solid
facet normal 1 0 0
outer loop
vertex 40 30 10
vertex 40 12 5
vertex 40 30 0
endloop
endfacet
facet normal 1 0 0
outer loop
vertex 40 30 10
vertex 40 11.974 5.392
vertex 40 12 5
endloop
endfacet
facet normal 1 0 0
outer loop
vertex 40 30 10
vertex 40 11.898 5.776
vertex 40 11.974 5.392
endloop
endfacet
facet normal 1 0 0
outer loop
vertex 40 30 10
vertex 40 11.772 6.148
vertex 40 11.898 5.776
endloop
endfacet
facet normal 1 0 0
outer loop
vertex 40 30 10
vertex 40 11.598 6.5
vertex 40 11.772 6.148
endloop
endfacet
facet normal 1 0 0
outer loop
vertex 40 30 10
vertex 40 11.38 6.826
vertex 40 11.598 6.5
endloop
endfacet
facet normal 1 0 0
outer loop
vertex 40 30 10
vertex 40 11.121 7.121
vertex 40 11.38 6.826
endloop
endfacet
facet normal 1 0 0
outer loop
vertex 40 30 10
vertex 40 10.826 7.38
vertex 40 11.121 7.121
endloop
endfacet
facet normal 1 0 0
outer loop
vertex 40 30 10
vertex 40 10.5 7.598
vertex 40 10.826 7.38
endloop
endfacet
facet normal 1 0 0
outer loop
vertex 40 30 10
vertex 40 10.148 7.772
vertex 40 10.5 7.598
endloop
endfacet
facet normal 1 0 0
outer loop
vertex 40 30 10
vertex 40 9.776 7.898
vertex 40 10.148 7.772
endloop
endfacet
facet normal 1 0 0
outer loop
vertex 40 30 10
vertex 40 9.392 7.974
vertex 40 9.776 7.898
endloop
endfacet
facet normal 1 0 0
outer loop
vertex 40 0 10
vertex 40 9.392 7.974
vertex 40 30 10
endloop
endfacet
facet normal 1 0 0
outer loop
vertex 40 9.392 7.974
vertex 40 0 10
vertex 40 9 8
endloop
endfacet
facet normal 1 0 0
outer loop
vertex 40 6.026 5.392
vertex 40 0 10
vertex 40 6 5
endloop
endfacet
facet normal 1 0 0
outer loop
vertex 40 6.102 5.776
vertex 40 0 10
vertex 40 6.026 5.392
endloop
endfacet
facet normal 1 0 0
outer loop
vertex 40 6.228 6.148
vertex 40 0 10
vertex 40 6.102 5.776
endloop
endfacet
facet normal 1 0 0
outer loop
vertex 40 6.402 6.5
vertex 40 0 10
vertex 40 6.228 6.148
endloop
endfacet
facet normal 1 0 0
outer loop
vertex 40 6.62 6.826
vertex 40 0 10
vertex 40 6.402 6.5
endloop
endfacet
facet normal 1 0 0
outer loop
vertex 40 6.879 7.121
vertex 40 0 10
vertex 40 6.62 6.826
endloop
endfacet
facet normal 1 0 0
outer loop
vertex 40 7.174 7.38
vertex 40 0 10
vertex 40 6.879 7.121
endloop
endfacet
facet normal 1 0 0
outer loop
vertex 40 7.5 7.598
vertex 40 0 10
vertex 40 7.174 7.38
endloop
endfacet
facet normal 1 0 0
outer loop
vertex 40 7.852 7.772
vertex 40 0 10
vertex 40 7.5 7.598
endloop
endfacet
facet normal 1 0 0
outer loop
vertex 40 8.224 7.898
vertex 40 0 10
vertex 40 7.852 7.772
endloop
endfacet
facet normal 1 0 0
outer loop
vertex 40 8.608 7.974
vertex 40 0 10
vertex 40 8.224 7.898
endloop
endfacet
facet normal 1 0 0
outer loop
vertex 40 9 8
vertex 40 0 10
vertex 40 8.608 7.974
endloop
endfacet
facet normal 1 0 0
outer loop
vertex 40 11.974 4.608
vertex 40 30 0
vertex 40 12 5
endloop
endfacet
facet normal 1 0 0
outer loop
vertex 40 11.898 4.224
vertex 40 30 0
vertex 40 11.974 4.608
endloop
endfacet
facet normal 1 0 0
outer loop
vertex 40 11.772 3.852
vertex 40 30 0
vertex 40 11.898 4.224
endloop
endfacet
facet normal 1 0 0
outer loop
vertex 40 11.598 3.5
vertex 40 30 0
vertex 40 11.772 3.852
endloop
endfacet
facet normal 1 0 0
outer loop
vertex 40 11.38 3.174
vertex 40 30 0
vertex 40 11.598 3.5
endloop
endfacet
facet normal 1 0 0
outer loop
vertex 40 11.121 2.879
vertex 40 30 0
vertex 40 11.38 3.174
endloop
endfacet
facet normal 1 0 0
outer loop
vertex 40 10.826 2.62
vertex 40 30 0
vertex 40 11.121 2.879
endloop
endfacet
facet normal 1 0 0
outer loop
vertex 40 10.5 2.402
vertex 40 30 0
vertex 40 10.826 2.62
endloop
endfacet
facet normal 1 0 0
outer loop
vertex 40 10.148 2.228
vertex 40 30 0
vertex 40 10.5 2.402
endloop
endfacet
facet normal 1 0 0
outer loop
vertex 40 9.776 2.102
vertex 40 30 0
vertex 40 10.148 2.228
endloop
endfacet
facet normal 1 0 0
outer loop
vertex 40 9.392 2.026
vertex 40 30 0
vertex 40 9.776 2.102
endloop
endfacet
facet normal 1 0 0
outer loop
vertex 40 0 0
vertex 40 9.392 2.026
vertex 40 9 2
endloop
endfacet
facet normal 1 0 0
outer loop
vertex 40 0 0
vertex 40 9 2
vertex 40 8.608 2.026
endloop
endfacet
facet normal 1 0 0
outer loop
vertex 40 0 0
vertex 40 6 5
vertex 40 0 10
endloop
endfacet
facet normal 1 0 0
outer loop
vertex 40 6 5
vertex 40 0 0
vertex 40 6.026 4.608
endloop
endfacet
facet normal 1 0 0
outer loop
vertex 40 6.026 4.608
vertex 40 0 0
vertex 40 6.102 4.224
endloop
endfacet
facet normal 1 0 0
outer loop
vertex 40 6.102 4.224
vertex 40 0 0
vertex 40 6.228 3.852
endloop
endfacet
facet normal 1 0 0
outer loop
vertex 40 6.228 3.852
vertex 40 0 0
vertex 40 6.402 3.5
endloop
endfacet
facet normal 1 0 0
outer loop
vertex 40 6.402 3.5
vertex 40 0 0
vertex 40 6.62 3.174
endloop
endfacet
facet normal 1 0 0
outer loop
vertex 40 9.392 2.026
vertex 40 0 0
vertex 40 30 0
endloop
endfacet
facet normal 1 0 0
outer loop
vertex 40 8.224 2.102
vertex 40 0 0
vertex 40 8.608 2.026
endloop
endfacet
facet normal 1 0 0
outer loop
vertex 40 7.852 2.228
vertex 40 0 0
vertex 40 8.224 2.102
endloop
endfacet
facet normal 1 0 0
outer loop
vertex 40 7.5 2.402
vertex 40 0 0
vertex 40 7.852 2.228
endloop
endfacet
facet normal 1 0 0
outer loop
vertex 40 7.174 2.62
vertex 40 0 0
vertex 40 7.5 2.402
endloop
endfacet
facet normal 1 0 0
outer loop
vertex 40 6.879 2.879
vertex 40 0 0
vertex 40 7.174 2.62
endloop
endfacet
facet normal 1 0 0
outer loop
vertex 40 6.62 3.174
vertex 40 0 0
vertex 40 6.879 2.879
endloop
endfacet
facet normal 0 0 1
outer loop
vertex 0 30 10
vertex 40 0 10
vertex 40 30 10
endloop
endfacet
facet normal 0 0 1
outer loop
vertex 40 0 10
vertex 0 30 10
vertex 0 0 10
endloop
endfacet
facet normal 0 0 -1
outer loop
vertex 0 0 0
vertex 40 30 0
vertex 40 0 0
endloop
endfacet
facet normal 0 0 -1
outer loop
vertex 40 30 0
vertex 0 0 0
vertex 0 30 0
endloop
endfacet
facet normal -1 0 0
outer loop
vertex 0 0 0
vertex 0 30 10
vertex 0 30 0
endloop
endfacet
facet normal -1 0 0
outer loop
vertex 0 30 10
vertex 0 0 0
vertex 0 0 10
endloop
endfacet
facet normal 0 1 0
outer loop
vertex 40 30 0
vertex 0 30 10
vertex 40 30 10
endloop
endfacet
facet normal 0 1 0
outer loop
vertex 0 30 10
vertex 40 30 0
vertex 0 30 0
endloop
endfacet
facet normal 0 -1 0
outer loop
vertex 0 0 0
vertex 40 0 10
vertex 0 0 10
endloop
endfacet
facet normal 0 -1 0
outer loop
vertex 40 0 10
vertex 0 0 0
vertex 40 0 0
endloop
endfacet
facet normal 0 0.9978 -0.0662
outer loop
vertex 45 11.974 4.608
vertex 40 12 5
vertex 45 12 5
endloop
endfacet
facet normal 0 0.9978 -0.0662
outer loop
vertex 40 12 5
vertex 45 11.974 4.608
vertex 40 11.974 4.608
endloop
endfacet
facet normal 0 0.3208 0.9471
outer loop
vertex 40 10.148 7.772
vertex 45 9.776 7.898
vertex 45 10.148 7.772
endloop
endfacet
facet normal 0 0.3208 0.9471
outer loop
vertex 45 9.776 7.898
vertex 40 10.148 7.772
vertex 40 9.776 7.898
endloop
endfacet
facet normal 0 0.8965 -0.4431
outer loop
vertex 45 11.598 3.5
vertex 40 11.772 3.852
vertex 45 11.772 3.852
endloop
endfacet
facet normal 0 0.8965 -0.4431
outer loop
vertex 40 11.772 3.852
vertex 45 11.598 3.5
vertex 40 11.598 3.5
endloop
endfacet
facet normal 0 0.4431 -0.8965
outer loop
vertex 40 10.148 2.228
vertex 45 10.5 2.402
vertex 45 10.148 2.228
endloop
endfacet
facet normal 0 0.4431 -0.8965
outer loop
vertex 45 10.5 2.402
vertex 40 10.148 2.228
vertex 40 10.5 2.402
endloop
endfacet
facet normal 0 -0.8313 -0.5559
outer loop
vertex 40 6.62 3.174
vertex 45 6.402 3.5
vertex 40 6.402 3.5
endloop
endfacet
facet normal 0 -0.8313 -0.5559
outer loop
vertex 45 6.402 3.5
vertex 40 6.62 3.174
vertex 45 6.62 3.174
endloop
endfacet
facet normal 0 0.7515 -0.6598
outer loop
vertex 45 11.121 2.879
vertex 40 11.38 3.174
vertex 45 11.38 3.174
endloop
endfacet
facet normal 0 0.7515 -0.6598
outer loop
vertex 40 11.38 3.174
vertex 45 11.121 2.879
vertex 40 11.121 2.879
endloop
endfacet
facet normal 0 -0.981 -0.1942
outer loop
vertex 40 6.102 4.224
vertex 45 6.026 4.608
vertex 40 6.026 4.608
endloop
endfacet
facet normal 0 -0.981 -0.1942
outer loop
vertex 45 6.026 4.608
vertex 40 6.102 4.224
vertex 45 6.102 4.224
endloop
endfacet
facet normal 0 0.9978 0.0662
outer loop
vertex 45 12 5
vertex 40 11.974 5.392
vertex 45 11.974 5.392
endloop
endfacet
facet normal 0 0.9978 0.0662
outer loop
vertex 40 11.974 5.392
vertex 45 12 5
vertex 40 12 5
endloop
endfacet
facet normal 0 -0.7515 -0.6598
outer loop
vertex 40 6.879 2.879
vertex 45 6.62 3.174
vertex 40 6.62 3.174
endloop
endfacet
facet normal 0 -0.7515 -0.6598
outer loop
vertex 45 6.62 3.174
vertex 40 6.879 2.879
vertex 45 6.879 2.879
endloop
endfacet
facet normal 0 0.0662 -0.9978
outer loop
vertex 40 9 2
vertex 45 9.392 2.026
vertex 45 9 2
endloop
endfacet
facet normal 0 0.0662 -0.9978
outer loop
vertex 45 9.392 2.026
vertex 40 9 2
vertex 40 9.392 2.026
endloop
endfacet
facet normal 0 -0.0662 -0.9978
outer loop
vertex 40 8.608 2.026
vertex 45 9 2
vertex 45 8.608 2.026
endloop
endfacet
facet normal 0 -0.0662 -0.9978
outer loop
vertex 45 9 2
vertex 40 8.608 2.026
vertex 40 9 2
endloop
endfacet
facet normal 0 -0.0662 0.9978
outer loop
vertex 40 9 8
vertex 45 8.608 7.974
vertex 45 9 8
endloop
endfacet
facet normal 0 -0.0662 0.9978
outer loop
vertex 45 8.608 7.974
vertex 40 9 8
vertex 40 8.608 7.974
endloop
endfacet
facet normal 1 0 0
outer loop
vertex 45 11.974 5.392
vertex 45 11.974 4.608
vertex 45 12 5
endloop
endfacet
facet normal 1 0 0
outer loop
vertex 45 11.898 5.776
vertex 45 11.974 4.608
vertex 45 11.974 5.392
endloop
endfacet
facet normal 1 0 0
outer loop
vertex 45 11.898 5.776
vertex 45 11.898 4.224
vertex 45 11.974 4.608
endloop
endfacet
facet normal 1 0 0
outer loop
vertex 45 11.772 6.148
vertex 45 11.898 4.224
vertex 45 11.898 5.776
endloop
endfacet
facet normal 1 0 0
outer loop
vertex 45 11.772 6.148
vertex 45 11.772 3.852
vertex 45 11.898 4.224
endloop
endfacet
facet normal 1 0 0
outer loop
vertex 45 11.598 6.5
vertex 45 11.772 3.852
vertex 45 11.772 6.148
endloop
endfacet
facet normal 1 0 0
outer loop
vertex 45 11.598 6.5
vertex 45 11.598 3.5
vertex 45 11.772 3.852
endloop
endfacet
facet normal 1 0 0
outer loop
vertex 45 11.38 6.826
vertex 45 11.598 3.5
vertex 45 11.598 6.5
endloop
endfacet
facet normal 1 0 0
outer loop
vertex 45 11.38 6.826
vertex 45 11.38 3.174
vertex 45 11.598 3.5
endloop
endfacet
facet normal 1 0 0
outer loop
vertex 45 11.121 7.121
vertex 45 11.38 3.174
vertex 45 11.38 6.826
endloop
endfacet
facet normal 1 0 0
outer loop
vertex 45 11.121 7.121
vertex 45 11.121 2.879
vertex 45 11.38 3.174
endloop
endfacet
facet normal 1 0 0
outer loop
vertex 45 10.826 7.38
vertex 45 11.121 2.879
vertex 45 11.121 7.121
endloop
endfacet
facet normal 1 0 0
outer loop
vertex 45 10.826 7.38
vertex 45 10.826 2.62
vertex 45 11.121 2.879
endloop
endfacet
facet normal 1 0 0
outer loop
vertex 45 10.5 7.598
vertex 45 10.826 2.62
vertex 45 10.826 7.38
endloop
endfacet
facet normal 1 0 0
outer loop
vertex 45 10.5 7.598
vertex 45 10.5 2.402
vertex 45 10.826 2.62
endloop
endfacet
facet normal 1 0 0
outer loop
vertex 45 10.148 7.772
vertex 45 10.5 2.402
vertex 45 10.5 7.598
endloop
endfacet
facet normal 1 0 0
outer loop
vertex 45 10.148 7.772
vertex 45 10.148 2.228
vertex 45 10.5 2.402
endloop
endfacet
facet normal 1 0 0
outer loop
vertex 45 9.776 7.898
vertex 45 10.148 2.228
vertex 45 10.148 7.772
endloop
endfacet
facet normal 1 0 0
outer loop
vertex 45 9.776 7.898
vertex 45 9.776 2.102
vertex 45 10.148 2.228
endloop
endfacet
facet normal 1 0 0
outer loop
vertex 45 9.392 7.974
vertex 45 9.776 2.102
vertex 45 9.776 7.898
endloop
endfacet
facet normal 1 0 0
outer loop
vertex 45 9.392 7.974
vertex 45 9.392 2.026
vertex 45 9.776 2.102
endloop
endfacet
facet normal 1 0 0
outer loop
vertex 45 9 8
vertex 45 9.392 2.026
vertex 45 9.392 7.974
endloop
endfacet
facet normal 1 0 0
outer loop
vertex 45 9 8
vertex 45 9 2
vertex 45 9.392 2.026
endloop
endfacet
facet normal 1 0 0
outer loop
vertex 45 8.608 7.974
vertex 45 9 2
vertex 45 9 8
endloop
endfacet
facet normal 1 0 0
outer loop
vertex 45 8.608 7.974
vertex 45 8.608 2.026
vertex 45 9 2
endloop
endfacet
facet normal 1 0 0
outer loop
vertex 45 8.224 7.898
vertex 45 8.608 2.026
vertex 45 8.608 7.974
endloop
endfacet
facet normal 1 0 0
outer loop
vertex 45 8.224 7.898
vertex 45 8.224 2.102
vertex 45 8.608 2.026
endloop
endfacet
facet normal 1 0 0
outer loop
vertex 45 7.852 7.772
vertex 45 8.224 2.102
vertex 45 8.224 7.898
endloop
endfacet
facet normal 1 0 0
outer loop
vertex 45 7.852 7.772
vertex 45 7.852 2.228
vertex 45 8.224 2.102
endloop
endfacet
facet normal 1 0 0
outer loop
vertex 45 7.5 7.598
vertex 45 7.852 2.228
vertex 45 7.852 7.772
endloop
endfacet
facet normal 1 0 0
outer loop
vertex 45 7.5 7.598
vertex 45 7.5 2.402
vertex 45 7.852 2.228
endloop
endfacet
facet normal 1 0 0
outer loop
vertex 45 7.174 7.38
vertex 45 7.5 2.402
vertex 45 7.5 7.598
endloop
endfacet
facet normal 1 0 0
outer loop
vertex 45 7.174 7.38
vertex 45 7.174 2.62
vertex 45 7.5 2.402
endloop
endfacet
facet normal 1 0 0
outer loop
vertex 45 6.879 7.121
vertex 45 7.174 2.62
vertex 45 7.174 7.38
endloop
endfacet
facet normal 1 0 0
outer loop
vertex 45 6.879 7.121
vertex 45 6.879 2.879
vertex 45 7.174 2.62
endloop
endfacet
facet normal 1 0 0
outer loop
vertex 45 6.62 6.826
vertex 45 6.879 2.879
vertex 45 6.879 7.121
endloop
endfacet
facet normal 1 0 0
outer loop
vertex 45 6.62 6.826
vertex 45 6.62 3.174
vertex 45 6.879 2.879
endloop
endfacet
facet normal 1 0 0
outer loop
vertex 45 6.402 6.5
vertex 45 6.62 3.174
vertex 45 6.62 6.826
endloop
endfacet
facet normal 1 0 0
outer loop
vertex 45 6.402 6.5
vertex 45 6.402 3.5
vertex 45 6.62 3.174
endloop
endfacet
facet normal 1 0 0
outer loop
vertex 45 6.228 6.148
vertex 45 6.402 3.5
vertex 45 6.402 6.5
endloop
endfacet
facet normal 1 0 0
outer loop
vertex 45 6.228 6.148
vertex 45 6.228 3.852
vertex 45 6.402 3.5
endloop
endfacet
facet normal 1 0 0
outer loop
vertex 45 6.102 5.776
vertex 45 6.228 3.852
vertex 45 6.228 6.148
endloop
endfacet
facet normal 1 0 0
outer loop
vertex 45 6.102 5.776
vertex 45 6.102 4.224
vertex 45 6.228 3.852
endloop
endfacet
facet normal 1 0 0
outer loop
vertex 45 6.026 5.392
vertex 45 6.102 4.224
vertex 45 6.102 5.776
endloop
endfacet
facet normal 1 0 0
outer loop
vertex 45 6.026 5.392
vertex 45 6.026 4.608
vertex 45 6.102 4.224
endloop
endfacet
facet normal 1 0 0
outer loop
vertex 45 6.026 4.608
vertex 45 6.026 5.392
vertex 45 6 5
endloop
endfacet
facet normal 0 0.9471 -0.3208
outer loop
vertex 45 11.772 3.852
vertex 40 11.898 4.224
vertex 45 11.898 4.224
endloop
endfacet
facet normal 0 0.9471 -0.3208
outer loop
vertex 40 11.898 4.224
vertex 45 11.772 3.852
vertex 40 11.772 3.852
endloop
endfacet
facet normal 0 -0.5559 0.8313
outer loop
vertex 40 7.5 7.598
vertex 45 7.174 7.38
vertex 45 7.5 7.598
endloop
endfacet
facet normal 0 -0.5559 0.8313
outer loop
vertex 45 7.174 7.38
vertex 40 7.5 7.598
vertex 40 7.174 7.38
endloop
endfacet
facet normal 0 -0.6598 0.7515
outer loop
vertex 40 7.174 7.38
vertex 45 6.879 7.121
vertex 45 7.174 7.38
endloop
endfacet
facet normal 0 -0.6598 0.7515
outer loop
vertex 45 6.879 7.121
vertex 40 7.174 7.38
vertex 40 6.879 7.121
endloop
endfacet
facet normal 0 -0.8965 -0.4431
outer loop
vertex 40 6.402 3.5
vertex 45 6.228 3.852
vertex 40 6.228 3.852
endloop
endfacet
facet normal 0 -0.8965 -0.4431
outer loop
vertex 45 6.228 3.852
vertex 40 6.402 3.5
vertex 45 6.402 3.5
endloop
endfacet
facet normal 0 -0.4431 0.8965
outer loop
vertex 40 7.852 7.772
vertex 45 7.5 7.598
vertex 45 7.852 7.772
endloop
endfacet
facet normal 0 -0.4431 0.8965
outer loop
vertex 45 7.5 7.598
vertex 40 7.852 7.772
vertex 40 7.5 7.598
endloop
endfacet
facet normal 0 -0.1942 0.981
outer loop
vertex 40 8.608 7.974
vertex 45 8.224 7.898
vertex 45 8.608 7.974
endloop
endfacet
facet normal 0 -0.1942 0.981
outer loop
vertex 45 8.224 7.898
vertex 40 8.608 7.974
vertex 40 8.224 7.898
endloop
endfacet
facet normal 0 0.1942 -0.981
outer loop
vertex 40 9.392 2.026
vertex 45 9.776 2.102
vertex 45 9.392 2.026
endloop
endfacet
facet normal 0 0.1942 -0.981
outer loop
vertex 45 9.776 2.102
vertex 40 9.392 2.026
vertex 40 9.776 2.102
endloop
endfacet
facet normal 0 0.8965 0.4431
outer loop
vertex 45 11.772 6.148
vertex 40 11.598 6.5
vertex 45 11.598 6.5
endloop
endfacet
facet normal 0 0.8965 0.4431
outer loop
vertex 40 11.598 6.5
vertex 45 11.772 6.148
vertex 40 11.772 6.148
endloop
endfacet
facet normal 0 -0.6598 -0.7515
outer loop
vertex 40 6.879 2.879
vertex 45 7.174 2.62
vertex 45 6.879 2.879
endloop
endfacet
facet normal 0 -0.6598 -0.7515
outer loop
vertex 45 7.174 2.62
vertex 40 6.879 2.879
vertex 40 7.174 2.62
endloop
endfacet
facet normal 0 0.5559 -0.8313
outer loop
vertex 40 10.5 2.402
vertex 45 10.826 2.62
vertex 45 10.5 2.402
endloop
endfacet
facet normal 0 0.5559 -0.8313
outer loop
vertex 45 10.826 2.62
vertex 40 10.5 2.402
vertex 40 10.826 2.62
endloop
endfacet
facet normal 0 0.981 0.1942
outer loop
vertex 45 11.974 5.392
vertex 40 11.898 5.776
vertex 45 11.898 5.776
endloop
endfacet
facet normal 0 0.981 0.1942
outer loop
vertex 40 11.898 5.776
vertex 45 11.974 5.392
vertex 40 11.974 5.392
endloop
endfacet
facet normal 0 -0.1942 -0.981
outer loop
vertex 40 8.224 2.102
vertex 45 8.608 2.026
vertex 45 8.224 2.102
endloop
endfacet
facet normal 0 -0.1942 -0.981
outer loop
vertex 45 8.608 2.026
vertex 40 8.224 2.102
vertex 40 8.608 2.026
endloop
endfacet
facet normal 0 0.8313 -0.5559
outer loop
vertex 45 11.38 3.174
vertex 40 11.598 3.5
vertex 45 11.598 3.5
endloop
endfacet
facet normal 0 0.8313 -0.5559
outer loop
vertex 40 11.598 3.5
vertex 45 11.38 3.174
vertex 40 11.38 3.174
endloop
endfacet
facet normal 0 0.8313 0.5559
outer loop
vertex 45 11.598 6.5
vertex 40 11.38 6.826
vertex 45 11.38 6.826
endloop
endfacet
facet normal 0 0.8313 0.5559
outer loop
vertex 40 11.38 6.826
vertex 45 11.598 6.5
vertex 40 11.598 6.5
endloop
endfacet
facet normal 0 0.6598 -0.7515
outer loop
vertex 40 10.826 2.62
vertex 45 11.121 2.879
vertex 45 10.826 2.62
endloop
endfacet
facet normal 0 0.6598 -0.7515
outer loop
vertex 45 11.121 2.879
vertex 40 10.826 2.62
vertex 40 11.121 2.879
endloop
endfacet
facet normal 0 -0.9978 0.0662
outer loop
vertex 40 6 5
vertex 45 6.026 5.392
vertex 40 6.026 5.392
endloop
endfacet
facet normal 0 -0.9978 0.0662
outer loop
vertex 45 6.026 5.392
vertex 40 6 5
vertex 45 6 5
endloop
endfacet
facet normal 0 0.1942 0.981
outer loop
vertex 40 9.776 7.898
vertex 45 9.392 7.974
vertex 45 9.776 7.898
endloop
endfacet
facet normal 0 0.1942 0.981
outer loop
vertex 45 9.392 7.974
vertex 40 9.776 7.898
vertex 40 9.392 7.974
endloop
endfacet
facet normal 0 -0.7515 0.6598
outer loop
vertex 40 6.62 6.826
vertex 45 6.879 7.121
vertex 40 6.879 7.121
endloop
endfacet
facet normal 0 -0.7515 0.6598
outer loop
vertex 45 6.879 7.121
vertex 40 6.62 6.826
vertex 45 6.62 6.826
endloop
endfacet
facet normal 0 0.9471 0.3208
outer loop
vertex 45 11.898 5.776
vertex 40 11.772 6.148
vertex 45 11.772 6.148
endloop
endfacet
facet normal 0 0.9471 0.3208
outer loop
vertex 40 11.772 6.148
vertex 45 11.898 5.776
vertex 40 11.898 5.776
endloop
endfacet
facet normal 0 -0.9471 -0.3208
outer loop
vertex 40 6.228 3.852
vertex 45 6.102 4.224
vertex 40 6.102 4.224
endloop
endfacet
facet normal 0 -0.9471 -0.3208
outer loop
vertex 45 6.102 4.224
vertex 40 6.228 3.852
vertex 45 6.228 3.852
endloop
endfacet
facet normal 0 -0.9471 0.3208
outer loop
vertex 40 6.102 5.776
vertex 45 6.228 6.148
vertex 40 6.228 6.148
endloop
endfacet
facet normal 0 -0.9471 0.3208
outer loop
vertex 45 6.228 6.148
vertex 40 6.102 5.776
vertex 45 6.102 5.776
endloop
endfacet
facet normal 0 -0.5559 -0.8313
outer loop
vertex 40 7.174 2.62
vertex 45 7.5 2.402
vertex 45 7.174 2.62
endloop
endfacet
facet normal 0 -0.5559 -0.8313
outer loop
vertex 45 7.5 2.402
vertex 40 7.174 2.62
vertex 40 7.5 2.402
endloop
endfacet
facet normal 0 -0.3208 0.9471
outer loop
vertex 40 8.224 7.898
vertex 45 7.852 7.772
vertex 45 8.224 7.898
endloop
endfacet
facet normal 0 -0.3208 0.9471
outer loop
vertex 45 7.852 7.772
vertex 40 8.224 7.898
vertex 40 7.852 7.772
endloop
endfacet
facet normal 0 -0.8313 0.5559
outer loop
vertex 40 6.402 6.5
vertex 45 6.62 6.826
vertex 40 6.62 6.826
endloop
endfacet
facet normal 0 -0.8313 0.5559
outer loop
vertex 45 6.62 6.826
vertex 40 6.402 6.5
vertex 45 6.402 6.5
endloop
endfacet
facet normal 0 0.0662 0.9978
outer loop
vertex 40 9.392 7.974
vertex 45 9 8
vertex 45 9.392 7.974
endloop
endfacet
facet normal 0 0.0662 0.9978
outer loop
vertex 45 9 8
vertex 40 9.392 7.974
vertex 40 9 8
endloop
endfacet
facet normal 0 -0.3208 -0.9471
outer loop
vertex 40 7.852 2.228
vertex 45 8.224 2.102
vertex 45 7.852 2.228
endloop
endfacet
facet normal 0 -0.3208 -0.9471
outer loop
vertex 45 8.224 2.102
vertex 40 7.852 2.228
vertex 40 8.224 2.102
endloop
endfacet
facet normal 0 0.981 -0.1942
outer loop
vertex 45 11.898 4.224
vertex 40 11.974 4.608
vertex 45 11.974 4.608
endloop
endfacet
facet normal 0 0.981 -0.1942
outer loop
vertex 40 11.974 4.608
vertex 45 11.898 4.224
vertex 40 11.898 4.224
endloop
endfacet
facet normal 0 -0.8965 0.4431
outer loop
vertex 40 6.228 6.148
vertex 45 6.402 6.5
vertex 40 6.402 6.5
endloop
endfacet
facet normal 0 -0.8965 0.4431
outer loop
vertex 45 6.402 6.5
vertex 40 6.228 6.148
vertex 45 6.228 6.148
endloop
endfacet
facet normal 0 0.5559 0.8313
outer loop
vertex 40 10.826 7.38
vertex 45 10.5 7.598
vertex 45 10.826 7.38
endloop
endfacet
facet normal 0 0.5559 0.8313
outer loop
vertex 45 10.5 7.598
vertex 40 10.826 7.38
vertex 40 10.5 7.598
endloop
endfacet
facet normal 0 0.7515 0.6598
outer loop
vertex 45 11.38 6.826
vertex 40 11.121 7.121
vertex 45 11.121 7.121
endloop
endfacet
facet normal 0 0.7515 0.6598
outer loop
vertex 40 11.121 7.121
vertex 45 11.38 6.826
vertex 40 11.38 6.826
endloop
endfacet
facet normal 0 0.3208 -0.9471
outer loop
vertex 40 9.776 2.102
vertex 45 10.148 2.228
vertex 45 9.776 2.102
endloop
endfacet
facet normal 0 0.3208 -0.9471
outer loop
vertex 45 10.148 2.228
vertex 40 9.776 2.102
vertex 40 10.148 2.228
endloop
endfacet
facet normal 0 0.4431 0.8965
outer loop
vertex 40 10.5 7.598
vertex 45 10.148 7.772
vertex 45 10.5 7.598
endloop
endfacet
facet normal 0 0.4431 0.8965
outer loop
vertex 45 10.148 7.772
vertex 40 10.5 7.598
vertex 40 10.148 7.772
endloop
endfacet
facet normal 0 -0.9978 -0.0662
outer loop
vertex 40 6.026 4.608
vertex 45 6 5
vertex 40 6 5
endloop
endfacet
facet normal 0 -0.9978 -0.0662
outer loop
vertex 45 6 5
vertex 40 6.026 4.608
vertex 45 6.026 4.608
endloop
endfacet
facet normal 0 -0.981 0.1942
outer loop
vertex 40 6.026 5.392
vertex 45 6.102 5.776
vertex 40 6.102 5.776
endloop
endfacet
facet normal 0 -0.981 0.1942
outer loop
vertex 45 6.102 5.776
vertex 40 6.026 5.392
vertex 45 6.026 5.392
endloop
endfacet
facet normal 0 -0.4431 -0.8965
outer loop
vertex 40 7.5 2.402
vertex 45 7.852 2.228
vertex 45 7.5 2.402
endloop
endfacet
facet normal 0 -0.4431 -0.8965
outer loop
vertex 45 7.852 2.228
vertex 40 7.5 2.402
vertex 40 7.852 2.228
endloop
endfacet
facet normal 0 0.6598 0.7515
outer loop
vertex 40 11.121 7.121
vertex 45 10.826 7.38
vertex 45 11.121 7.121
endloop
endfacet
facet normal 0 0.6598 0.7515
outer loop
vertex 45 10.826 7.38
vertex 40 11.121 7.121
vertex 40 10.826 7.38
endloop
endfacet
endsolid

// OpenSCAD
// units=mm — generated by scad_emitter.py
// part=unnamed
$fn = 48;

union() { cube([40, 30, 10]); translate([39.5, 9, 5]) rotate([0, 90, 0]) cylinder(h=5.5, r=3, $fn=$fn); }
